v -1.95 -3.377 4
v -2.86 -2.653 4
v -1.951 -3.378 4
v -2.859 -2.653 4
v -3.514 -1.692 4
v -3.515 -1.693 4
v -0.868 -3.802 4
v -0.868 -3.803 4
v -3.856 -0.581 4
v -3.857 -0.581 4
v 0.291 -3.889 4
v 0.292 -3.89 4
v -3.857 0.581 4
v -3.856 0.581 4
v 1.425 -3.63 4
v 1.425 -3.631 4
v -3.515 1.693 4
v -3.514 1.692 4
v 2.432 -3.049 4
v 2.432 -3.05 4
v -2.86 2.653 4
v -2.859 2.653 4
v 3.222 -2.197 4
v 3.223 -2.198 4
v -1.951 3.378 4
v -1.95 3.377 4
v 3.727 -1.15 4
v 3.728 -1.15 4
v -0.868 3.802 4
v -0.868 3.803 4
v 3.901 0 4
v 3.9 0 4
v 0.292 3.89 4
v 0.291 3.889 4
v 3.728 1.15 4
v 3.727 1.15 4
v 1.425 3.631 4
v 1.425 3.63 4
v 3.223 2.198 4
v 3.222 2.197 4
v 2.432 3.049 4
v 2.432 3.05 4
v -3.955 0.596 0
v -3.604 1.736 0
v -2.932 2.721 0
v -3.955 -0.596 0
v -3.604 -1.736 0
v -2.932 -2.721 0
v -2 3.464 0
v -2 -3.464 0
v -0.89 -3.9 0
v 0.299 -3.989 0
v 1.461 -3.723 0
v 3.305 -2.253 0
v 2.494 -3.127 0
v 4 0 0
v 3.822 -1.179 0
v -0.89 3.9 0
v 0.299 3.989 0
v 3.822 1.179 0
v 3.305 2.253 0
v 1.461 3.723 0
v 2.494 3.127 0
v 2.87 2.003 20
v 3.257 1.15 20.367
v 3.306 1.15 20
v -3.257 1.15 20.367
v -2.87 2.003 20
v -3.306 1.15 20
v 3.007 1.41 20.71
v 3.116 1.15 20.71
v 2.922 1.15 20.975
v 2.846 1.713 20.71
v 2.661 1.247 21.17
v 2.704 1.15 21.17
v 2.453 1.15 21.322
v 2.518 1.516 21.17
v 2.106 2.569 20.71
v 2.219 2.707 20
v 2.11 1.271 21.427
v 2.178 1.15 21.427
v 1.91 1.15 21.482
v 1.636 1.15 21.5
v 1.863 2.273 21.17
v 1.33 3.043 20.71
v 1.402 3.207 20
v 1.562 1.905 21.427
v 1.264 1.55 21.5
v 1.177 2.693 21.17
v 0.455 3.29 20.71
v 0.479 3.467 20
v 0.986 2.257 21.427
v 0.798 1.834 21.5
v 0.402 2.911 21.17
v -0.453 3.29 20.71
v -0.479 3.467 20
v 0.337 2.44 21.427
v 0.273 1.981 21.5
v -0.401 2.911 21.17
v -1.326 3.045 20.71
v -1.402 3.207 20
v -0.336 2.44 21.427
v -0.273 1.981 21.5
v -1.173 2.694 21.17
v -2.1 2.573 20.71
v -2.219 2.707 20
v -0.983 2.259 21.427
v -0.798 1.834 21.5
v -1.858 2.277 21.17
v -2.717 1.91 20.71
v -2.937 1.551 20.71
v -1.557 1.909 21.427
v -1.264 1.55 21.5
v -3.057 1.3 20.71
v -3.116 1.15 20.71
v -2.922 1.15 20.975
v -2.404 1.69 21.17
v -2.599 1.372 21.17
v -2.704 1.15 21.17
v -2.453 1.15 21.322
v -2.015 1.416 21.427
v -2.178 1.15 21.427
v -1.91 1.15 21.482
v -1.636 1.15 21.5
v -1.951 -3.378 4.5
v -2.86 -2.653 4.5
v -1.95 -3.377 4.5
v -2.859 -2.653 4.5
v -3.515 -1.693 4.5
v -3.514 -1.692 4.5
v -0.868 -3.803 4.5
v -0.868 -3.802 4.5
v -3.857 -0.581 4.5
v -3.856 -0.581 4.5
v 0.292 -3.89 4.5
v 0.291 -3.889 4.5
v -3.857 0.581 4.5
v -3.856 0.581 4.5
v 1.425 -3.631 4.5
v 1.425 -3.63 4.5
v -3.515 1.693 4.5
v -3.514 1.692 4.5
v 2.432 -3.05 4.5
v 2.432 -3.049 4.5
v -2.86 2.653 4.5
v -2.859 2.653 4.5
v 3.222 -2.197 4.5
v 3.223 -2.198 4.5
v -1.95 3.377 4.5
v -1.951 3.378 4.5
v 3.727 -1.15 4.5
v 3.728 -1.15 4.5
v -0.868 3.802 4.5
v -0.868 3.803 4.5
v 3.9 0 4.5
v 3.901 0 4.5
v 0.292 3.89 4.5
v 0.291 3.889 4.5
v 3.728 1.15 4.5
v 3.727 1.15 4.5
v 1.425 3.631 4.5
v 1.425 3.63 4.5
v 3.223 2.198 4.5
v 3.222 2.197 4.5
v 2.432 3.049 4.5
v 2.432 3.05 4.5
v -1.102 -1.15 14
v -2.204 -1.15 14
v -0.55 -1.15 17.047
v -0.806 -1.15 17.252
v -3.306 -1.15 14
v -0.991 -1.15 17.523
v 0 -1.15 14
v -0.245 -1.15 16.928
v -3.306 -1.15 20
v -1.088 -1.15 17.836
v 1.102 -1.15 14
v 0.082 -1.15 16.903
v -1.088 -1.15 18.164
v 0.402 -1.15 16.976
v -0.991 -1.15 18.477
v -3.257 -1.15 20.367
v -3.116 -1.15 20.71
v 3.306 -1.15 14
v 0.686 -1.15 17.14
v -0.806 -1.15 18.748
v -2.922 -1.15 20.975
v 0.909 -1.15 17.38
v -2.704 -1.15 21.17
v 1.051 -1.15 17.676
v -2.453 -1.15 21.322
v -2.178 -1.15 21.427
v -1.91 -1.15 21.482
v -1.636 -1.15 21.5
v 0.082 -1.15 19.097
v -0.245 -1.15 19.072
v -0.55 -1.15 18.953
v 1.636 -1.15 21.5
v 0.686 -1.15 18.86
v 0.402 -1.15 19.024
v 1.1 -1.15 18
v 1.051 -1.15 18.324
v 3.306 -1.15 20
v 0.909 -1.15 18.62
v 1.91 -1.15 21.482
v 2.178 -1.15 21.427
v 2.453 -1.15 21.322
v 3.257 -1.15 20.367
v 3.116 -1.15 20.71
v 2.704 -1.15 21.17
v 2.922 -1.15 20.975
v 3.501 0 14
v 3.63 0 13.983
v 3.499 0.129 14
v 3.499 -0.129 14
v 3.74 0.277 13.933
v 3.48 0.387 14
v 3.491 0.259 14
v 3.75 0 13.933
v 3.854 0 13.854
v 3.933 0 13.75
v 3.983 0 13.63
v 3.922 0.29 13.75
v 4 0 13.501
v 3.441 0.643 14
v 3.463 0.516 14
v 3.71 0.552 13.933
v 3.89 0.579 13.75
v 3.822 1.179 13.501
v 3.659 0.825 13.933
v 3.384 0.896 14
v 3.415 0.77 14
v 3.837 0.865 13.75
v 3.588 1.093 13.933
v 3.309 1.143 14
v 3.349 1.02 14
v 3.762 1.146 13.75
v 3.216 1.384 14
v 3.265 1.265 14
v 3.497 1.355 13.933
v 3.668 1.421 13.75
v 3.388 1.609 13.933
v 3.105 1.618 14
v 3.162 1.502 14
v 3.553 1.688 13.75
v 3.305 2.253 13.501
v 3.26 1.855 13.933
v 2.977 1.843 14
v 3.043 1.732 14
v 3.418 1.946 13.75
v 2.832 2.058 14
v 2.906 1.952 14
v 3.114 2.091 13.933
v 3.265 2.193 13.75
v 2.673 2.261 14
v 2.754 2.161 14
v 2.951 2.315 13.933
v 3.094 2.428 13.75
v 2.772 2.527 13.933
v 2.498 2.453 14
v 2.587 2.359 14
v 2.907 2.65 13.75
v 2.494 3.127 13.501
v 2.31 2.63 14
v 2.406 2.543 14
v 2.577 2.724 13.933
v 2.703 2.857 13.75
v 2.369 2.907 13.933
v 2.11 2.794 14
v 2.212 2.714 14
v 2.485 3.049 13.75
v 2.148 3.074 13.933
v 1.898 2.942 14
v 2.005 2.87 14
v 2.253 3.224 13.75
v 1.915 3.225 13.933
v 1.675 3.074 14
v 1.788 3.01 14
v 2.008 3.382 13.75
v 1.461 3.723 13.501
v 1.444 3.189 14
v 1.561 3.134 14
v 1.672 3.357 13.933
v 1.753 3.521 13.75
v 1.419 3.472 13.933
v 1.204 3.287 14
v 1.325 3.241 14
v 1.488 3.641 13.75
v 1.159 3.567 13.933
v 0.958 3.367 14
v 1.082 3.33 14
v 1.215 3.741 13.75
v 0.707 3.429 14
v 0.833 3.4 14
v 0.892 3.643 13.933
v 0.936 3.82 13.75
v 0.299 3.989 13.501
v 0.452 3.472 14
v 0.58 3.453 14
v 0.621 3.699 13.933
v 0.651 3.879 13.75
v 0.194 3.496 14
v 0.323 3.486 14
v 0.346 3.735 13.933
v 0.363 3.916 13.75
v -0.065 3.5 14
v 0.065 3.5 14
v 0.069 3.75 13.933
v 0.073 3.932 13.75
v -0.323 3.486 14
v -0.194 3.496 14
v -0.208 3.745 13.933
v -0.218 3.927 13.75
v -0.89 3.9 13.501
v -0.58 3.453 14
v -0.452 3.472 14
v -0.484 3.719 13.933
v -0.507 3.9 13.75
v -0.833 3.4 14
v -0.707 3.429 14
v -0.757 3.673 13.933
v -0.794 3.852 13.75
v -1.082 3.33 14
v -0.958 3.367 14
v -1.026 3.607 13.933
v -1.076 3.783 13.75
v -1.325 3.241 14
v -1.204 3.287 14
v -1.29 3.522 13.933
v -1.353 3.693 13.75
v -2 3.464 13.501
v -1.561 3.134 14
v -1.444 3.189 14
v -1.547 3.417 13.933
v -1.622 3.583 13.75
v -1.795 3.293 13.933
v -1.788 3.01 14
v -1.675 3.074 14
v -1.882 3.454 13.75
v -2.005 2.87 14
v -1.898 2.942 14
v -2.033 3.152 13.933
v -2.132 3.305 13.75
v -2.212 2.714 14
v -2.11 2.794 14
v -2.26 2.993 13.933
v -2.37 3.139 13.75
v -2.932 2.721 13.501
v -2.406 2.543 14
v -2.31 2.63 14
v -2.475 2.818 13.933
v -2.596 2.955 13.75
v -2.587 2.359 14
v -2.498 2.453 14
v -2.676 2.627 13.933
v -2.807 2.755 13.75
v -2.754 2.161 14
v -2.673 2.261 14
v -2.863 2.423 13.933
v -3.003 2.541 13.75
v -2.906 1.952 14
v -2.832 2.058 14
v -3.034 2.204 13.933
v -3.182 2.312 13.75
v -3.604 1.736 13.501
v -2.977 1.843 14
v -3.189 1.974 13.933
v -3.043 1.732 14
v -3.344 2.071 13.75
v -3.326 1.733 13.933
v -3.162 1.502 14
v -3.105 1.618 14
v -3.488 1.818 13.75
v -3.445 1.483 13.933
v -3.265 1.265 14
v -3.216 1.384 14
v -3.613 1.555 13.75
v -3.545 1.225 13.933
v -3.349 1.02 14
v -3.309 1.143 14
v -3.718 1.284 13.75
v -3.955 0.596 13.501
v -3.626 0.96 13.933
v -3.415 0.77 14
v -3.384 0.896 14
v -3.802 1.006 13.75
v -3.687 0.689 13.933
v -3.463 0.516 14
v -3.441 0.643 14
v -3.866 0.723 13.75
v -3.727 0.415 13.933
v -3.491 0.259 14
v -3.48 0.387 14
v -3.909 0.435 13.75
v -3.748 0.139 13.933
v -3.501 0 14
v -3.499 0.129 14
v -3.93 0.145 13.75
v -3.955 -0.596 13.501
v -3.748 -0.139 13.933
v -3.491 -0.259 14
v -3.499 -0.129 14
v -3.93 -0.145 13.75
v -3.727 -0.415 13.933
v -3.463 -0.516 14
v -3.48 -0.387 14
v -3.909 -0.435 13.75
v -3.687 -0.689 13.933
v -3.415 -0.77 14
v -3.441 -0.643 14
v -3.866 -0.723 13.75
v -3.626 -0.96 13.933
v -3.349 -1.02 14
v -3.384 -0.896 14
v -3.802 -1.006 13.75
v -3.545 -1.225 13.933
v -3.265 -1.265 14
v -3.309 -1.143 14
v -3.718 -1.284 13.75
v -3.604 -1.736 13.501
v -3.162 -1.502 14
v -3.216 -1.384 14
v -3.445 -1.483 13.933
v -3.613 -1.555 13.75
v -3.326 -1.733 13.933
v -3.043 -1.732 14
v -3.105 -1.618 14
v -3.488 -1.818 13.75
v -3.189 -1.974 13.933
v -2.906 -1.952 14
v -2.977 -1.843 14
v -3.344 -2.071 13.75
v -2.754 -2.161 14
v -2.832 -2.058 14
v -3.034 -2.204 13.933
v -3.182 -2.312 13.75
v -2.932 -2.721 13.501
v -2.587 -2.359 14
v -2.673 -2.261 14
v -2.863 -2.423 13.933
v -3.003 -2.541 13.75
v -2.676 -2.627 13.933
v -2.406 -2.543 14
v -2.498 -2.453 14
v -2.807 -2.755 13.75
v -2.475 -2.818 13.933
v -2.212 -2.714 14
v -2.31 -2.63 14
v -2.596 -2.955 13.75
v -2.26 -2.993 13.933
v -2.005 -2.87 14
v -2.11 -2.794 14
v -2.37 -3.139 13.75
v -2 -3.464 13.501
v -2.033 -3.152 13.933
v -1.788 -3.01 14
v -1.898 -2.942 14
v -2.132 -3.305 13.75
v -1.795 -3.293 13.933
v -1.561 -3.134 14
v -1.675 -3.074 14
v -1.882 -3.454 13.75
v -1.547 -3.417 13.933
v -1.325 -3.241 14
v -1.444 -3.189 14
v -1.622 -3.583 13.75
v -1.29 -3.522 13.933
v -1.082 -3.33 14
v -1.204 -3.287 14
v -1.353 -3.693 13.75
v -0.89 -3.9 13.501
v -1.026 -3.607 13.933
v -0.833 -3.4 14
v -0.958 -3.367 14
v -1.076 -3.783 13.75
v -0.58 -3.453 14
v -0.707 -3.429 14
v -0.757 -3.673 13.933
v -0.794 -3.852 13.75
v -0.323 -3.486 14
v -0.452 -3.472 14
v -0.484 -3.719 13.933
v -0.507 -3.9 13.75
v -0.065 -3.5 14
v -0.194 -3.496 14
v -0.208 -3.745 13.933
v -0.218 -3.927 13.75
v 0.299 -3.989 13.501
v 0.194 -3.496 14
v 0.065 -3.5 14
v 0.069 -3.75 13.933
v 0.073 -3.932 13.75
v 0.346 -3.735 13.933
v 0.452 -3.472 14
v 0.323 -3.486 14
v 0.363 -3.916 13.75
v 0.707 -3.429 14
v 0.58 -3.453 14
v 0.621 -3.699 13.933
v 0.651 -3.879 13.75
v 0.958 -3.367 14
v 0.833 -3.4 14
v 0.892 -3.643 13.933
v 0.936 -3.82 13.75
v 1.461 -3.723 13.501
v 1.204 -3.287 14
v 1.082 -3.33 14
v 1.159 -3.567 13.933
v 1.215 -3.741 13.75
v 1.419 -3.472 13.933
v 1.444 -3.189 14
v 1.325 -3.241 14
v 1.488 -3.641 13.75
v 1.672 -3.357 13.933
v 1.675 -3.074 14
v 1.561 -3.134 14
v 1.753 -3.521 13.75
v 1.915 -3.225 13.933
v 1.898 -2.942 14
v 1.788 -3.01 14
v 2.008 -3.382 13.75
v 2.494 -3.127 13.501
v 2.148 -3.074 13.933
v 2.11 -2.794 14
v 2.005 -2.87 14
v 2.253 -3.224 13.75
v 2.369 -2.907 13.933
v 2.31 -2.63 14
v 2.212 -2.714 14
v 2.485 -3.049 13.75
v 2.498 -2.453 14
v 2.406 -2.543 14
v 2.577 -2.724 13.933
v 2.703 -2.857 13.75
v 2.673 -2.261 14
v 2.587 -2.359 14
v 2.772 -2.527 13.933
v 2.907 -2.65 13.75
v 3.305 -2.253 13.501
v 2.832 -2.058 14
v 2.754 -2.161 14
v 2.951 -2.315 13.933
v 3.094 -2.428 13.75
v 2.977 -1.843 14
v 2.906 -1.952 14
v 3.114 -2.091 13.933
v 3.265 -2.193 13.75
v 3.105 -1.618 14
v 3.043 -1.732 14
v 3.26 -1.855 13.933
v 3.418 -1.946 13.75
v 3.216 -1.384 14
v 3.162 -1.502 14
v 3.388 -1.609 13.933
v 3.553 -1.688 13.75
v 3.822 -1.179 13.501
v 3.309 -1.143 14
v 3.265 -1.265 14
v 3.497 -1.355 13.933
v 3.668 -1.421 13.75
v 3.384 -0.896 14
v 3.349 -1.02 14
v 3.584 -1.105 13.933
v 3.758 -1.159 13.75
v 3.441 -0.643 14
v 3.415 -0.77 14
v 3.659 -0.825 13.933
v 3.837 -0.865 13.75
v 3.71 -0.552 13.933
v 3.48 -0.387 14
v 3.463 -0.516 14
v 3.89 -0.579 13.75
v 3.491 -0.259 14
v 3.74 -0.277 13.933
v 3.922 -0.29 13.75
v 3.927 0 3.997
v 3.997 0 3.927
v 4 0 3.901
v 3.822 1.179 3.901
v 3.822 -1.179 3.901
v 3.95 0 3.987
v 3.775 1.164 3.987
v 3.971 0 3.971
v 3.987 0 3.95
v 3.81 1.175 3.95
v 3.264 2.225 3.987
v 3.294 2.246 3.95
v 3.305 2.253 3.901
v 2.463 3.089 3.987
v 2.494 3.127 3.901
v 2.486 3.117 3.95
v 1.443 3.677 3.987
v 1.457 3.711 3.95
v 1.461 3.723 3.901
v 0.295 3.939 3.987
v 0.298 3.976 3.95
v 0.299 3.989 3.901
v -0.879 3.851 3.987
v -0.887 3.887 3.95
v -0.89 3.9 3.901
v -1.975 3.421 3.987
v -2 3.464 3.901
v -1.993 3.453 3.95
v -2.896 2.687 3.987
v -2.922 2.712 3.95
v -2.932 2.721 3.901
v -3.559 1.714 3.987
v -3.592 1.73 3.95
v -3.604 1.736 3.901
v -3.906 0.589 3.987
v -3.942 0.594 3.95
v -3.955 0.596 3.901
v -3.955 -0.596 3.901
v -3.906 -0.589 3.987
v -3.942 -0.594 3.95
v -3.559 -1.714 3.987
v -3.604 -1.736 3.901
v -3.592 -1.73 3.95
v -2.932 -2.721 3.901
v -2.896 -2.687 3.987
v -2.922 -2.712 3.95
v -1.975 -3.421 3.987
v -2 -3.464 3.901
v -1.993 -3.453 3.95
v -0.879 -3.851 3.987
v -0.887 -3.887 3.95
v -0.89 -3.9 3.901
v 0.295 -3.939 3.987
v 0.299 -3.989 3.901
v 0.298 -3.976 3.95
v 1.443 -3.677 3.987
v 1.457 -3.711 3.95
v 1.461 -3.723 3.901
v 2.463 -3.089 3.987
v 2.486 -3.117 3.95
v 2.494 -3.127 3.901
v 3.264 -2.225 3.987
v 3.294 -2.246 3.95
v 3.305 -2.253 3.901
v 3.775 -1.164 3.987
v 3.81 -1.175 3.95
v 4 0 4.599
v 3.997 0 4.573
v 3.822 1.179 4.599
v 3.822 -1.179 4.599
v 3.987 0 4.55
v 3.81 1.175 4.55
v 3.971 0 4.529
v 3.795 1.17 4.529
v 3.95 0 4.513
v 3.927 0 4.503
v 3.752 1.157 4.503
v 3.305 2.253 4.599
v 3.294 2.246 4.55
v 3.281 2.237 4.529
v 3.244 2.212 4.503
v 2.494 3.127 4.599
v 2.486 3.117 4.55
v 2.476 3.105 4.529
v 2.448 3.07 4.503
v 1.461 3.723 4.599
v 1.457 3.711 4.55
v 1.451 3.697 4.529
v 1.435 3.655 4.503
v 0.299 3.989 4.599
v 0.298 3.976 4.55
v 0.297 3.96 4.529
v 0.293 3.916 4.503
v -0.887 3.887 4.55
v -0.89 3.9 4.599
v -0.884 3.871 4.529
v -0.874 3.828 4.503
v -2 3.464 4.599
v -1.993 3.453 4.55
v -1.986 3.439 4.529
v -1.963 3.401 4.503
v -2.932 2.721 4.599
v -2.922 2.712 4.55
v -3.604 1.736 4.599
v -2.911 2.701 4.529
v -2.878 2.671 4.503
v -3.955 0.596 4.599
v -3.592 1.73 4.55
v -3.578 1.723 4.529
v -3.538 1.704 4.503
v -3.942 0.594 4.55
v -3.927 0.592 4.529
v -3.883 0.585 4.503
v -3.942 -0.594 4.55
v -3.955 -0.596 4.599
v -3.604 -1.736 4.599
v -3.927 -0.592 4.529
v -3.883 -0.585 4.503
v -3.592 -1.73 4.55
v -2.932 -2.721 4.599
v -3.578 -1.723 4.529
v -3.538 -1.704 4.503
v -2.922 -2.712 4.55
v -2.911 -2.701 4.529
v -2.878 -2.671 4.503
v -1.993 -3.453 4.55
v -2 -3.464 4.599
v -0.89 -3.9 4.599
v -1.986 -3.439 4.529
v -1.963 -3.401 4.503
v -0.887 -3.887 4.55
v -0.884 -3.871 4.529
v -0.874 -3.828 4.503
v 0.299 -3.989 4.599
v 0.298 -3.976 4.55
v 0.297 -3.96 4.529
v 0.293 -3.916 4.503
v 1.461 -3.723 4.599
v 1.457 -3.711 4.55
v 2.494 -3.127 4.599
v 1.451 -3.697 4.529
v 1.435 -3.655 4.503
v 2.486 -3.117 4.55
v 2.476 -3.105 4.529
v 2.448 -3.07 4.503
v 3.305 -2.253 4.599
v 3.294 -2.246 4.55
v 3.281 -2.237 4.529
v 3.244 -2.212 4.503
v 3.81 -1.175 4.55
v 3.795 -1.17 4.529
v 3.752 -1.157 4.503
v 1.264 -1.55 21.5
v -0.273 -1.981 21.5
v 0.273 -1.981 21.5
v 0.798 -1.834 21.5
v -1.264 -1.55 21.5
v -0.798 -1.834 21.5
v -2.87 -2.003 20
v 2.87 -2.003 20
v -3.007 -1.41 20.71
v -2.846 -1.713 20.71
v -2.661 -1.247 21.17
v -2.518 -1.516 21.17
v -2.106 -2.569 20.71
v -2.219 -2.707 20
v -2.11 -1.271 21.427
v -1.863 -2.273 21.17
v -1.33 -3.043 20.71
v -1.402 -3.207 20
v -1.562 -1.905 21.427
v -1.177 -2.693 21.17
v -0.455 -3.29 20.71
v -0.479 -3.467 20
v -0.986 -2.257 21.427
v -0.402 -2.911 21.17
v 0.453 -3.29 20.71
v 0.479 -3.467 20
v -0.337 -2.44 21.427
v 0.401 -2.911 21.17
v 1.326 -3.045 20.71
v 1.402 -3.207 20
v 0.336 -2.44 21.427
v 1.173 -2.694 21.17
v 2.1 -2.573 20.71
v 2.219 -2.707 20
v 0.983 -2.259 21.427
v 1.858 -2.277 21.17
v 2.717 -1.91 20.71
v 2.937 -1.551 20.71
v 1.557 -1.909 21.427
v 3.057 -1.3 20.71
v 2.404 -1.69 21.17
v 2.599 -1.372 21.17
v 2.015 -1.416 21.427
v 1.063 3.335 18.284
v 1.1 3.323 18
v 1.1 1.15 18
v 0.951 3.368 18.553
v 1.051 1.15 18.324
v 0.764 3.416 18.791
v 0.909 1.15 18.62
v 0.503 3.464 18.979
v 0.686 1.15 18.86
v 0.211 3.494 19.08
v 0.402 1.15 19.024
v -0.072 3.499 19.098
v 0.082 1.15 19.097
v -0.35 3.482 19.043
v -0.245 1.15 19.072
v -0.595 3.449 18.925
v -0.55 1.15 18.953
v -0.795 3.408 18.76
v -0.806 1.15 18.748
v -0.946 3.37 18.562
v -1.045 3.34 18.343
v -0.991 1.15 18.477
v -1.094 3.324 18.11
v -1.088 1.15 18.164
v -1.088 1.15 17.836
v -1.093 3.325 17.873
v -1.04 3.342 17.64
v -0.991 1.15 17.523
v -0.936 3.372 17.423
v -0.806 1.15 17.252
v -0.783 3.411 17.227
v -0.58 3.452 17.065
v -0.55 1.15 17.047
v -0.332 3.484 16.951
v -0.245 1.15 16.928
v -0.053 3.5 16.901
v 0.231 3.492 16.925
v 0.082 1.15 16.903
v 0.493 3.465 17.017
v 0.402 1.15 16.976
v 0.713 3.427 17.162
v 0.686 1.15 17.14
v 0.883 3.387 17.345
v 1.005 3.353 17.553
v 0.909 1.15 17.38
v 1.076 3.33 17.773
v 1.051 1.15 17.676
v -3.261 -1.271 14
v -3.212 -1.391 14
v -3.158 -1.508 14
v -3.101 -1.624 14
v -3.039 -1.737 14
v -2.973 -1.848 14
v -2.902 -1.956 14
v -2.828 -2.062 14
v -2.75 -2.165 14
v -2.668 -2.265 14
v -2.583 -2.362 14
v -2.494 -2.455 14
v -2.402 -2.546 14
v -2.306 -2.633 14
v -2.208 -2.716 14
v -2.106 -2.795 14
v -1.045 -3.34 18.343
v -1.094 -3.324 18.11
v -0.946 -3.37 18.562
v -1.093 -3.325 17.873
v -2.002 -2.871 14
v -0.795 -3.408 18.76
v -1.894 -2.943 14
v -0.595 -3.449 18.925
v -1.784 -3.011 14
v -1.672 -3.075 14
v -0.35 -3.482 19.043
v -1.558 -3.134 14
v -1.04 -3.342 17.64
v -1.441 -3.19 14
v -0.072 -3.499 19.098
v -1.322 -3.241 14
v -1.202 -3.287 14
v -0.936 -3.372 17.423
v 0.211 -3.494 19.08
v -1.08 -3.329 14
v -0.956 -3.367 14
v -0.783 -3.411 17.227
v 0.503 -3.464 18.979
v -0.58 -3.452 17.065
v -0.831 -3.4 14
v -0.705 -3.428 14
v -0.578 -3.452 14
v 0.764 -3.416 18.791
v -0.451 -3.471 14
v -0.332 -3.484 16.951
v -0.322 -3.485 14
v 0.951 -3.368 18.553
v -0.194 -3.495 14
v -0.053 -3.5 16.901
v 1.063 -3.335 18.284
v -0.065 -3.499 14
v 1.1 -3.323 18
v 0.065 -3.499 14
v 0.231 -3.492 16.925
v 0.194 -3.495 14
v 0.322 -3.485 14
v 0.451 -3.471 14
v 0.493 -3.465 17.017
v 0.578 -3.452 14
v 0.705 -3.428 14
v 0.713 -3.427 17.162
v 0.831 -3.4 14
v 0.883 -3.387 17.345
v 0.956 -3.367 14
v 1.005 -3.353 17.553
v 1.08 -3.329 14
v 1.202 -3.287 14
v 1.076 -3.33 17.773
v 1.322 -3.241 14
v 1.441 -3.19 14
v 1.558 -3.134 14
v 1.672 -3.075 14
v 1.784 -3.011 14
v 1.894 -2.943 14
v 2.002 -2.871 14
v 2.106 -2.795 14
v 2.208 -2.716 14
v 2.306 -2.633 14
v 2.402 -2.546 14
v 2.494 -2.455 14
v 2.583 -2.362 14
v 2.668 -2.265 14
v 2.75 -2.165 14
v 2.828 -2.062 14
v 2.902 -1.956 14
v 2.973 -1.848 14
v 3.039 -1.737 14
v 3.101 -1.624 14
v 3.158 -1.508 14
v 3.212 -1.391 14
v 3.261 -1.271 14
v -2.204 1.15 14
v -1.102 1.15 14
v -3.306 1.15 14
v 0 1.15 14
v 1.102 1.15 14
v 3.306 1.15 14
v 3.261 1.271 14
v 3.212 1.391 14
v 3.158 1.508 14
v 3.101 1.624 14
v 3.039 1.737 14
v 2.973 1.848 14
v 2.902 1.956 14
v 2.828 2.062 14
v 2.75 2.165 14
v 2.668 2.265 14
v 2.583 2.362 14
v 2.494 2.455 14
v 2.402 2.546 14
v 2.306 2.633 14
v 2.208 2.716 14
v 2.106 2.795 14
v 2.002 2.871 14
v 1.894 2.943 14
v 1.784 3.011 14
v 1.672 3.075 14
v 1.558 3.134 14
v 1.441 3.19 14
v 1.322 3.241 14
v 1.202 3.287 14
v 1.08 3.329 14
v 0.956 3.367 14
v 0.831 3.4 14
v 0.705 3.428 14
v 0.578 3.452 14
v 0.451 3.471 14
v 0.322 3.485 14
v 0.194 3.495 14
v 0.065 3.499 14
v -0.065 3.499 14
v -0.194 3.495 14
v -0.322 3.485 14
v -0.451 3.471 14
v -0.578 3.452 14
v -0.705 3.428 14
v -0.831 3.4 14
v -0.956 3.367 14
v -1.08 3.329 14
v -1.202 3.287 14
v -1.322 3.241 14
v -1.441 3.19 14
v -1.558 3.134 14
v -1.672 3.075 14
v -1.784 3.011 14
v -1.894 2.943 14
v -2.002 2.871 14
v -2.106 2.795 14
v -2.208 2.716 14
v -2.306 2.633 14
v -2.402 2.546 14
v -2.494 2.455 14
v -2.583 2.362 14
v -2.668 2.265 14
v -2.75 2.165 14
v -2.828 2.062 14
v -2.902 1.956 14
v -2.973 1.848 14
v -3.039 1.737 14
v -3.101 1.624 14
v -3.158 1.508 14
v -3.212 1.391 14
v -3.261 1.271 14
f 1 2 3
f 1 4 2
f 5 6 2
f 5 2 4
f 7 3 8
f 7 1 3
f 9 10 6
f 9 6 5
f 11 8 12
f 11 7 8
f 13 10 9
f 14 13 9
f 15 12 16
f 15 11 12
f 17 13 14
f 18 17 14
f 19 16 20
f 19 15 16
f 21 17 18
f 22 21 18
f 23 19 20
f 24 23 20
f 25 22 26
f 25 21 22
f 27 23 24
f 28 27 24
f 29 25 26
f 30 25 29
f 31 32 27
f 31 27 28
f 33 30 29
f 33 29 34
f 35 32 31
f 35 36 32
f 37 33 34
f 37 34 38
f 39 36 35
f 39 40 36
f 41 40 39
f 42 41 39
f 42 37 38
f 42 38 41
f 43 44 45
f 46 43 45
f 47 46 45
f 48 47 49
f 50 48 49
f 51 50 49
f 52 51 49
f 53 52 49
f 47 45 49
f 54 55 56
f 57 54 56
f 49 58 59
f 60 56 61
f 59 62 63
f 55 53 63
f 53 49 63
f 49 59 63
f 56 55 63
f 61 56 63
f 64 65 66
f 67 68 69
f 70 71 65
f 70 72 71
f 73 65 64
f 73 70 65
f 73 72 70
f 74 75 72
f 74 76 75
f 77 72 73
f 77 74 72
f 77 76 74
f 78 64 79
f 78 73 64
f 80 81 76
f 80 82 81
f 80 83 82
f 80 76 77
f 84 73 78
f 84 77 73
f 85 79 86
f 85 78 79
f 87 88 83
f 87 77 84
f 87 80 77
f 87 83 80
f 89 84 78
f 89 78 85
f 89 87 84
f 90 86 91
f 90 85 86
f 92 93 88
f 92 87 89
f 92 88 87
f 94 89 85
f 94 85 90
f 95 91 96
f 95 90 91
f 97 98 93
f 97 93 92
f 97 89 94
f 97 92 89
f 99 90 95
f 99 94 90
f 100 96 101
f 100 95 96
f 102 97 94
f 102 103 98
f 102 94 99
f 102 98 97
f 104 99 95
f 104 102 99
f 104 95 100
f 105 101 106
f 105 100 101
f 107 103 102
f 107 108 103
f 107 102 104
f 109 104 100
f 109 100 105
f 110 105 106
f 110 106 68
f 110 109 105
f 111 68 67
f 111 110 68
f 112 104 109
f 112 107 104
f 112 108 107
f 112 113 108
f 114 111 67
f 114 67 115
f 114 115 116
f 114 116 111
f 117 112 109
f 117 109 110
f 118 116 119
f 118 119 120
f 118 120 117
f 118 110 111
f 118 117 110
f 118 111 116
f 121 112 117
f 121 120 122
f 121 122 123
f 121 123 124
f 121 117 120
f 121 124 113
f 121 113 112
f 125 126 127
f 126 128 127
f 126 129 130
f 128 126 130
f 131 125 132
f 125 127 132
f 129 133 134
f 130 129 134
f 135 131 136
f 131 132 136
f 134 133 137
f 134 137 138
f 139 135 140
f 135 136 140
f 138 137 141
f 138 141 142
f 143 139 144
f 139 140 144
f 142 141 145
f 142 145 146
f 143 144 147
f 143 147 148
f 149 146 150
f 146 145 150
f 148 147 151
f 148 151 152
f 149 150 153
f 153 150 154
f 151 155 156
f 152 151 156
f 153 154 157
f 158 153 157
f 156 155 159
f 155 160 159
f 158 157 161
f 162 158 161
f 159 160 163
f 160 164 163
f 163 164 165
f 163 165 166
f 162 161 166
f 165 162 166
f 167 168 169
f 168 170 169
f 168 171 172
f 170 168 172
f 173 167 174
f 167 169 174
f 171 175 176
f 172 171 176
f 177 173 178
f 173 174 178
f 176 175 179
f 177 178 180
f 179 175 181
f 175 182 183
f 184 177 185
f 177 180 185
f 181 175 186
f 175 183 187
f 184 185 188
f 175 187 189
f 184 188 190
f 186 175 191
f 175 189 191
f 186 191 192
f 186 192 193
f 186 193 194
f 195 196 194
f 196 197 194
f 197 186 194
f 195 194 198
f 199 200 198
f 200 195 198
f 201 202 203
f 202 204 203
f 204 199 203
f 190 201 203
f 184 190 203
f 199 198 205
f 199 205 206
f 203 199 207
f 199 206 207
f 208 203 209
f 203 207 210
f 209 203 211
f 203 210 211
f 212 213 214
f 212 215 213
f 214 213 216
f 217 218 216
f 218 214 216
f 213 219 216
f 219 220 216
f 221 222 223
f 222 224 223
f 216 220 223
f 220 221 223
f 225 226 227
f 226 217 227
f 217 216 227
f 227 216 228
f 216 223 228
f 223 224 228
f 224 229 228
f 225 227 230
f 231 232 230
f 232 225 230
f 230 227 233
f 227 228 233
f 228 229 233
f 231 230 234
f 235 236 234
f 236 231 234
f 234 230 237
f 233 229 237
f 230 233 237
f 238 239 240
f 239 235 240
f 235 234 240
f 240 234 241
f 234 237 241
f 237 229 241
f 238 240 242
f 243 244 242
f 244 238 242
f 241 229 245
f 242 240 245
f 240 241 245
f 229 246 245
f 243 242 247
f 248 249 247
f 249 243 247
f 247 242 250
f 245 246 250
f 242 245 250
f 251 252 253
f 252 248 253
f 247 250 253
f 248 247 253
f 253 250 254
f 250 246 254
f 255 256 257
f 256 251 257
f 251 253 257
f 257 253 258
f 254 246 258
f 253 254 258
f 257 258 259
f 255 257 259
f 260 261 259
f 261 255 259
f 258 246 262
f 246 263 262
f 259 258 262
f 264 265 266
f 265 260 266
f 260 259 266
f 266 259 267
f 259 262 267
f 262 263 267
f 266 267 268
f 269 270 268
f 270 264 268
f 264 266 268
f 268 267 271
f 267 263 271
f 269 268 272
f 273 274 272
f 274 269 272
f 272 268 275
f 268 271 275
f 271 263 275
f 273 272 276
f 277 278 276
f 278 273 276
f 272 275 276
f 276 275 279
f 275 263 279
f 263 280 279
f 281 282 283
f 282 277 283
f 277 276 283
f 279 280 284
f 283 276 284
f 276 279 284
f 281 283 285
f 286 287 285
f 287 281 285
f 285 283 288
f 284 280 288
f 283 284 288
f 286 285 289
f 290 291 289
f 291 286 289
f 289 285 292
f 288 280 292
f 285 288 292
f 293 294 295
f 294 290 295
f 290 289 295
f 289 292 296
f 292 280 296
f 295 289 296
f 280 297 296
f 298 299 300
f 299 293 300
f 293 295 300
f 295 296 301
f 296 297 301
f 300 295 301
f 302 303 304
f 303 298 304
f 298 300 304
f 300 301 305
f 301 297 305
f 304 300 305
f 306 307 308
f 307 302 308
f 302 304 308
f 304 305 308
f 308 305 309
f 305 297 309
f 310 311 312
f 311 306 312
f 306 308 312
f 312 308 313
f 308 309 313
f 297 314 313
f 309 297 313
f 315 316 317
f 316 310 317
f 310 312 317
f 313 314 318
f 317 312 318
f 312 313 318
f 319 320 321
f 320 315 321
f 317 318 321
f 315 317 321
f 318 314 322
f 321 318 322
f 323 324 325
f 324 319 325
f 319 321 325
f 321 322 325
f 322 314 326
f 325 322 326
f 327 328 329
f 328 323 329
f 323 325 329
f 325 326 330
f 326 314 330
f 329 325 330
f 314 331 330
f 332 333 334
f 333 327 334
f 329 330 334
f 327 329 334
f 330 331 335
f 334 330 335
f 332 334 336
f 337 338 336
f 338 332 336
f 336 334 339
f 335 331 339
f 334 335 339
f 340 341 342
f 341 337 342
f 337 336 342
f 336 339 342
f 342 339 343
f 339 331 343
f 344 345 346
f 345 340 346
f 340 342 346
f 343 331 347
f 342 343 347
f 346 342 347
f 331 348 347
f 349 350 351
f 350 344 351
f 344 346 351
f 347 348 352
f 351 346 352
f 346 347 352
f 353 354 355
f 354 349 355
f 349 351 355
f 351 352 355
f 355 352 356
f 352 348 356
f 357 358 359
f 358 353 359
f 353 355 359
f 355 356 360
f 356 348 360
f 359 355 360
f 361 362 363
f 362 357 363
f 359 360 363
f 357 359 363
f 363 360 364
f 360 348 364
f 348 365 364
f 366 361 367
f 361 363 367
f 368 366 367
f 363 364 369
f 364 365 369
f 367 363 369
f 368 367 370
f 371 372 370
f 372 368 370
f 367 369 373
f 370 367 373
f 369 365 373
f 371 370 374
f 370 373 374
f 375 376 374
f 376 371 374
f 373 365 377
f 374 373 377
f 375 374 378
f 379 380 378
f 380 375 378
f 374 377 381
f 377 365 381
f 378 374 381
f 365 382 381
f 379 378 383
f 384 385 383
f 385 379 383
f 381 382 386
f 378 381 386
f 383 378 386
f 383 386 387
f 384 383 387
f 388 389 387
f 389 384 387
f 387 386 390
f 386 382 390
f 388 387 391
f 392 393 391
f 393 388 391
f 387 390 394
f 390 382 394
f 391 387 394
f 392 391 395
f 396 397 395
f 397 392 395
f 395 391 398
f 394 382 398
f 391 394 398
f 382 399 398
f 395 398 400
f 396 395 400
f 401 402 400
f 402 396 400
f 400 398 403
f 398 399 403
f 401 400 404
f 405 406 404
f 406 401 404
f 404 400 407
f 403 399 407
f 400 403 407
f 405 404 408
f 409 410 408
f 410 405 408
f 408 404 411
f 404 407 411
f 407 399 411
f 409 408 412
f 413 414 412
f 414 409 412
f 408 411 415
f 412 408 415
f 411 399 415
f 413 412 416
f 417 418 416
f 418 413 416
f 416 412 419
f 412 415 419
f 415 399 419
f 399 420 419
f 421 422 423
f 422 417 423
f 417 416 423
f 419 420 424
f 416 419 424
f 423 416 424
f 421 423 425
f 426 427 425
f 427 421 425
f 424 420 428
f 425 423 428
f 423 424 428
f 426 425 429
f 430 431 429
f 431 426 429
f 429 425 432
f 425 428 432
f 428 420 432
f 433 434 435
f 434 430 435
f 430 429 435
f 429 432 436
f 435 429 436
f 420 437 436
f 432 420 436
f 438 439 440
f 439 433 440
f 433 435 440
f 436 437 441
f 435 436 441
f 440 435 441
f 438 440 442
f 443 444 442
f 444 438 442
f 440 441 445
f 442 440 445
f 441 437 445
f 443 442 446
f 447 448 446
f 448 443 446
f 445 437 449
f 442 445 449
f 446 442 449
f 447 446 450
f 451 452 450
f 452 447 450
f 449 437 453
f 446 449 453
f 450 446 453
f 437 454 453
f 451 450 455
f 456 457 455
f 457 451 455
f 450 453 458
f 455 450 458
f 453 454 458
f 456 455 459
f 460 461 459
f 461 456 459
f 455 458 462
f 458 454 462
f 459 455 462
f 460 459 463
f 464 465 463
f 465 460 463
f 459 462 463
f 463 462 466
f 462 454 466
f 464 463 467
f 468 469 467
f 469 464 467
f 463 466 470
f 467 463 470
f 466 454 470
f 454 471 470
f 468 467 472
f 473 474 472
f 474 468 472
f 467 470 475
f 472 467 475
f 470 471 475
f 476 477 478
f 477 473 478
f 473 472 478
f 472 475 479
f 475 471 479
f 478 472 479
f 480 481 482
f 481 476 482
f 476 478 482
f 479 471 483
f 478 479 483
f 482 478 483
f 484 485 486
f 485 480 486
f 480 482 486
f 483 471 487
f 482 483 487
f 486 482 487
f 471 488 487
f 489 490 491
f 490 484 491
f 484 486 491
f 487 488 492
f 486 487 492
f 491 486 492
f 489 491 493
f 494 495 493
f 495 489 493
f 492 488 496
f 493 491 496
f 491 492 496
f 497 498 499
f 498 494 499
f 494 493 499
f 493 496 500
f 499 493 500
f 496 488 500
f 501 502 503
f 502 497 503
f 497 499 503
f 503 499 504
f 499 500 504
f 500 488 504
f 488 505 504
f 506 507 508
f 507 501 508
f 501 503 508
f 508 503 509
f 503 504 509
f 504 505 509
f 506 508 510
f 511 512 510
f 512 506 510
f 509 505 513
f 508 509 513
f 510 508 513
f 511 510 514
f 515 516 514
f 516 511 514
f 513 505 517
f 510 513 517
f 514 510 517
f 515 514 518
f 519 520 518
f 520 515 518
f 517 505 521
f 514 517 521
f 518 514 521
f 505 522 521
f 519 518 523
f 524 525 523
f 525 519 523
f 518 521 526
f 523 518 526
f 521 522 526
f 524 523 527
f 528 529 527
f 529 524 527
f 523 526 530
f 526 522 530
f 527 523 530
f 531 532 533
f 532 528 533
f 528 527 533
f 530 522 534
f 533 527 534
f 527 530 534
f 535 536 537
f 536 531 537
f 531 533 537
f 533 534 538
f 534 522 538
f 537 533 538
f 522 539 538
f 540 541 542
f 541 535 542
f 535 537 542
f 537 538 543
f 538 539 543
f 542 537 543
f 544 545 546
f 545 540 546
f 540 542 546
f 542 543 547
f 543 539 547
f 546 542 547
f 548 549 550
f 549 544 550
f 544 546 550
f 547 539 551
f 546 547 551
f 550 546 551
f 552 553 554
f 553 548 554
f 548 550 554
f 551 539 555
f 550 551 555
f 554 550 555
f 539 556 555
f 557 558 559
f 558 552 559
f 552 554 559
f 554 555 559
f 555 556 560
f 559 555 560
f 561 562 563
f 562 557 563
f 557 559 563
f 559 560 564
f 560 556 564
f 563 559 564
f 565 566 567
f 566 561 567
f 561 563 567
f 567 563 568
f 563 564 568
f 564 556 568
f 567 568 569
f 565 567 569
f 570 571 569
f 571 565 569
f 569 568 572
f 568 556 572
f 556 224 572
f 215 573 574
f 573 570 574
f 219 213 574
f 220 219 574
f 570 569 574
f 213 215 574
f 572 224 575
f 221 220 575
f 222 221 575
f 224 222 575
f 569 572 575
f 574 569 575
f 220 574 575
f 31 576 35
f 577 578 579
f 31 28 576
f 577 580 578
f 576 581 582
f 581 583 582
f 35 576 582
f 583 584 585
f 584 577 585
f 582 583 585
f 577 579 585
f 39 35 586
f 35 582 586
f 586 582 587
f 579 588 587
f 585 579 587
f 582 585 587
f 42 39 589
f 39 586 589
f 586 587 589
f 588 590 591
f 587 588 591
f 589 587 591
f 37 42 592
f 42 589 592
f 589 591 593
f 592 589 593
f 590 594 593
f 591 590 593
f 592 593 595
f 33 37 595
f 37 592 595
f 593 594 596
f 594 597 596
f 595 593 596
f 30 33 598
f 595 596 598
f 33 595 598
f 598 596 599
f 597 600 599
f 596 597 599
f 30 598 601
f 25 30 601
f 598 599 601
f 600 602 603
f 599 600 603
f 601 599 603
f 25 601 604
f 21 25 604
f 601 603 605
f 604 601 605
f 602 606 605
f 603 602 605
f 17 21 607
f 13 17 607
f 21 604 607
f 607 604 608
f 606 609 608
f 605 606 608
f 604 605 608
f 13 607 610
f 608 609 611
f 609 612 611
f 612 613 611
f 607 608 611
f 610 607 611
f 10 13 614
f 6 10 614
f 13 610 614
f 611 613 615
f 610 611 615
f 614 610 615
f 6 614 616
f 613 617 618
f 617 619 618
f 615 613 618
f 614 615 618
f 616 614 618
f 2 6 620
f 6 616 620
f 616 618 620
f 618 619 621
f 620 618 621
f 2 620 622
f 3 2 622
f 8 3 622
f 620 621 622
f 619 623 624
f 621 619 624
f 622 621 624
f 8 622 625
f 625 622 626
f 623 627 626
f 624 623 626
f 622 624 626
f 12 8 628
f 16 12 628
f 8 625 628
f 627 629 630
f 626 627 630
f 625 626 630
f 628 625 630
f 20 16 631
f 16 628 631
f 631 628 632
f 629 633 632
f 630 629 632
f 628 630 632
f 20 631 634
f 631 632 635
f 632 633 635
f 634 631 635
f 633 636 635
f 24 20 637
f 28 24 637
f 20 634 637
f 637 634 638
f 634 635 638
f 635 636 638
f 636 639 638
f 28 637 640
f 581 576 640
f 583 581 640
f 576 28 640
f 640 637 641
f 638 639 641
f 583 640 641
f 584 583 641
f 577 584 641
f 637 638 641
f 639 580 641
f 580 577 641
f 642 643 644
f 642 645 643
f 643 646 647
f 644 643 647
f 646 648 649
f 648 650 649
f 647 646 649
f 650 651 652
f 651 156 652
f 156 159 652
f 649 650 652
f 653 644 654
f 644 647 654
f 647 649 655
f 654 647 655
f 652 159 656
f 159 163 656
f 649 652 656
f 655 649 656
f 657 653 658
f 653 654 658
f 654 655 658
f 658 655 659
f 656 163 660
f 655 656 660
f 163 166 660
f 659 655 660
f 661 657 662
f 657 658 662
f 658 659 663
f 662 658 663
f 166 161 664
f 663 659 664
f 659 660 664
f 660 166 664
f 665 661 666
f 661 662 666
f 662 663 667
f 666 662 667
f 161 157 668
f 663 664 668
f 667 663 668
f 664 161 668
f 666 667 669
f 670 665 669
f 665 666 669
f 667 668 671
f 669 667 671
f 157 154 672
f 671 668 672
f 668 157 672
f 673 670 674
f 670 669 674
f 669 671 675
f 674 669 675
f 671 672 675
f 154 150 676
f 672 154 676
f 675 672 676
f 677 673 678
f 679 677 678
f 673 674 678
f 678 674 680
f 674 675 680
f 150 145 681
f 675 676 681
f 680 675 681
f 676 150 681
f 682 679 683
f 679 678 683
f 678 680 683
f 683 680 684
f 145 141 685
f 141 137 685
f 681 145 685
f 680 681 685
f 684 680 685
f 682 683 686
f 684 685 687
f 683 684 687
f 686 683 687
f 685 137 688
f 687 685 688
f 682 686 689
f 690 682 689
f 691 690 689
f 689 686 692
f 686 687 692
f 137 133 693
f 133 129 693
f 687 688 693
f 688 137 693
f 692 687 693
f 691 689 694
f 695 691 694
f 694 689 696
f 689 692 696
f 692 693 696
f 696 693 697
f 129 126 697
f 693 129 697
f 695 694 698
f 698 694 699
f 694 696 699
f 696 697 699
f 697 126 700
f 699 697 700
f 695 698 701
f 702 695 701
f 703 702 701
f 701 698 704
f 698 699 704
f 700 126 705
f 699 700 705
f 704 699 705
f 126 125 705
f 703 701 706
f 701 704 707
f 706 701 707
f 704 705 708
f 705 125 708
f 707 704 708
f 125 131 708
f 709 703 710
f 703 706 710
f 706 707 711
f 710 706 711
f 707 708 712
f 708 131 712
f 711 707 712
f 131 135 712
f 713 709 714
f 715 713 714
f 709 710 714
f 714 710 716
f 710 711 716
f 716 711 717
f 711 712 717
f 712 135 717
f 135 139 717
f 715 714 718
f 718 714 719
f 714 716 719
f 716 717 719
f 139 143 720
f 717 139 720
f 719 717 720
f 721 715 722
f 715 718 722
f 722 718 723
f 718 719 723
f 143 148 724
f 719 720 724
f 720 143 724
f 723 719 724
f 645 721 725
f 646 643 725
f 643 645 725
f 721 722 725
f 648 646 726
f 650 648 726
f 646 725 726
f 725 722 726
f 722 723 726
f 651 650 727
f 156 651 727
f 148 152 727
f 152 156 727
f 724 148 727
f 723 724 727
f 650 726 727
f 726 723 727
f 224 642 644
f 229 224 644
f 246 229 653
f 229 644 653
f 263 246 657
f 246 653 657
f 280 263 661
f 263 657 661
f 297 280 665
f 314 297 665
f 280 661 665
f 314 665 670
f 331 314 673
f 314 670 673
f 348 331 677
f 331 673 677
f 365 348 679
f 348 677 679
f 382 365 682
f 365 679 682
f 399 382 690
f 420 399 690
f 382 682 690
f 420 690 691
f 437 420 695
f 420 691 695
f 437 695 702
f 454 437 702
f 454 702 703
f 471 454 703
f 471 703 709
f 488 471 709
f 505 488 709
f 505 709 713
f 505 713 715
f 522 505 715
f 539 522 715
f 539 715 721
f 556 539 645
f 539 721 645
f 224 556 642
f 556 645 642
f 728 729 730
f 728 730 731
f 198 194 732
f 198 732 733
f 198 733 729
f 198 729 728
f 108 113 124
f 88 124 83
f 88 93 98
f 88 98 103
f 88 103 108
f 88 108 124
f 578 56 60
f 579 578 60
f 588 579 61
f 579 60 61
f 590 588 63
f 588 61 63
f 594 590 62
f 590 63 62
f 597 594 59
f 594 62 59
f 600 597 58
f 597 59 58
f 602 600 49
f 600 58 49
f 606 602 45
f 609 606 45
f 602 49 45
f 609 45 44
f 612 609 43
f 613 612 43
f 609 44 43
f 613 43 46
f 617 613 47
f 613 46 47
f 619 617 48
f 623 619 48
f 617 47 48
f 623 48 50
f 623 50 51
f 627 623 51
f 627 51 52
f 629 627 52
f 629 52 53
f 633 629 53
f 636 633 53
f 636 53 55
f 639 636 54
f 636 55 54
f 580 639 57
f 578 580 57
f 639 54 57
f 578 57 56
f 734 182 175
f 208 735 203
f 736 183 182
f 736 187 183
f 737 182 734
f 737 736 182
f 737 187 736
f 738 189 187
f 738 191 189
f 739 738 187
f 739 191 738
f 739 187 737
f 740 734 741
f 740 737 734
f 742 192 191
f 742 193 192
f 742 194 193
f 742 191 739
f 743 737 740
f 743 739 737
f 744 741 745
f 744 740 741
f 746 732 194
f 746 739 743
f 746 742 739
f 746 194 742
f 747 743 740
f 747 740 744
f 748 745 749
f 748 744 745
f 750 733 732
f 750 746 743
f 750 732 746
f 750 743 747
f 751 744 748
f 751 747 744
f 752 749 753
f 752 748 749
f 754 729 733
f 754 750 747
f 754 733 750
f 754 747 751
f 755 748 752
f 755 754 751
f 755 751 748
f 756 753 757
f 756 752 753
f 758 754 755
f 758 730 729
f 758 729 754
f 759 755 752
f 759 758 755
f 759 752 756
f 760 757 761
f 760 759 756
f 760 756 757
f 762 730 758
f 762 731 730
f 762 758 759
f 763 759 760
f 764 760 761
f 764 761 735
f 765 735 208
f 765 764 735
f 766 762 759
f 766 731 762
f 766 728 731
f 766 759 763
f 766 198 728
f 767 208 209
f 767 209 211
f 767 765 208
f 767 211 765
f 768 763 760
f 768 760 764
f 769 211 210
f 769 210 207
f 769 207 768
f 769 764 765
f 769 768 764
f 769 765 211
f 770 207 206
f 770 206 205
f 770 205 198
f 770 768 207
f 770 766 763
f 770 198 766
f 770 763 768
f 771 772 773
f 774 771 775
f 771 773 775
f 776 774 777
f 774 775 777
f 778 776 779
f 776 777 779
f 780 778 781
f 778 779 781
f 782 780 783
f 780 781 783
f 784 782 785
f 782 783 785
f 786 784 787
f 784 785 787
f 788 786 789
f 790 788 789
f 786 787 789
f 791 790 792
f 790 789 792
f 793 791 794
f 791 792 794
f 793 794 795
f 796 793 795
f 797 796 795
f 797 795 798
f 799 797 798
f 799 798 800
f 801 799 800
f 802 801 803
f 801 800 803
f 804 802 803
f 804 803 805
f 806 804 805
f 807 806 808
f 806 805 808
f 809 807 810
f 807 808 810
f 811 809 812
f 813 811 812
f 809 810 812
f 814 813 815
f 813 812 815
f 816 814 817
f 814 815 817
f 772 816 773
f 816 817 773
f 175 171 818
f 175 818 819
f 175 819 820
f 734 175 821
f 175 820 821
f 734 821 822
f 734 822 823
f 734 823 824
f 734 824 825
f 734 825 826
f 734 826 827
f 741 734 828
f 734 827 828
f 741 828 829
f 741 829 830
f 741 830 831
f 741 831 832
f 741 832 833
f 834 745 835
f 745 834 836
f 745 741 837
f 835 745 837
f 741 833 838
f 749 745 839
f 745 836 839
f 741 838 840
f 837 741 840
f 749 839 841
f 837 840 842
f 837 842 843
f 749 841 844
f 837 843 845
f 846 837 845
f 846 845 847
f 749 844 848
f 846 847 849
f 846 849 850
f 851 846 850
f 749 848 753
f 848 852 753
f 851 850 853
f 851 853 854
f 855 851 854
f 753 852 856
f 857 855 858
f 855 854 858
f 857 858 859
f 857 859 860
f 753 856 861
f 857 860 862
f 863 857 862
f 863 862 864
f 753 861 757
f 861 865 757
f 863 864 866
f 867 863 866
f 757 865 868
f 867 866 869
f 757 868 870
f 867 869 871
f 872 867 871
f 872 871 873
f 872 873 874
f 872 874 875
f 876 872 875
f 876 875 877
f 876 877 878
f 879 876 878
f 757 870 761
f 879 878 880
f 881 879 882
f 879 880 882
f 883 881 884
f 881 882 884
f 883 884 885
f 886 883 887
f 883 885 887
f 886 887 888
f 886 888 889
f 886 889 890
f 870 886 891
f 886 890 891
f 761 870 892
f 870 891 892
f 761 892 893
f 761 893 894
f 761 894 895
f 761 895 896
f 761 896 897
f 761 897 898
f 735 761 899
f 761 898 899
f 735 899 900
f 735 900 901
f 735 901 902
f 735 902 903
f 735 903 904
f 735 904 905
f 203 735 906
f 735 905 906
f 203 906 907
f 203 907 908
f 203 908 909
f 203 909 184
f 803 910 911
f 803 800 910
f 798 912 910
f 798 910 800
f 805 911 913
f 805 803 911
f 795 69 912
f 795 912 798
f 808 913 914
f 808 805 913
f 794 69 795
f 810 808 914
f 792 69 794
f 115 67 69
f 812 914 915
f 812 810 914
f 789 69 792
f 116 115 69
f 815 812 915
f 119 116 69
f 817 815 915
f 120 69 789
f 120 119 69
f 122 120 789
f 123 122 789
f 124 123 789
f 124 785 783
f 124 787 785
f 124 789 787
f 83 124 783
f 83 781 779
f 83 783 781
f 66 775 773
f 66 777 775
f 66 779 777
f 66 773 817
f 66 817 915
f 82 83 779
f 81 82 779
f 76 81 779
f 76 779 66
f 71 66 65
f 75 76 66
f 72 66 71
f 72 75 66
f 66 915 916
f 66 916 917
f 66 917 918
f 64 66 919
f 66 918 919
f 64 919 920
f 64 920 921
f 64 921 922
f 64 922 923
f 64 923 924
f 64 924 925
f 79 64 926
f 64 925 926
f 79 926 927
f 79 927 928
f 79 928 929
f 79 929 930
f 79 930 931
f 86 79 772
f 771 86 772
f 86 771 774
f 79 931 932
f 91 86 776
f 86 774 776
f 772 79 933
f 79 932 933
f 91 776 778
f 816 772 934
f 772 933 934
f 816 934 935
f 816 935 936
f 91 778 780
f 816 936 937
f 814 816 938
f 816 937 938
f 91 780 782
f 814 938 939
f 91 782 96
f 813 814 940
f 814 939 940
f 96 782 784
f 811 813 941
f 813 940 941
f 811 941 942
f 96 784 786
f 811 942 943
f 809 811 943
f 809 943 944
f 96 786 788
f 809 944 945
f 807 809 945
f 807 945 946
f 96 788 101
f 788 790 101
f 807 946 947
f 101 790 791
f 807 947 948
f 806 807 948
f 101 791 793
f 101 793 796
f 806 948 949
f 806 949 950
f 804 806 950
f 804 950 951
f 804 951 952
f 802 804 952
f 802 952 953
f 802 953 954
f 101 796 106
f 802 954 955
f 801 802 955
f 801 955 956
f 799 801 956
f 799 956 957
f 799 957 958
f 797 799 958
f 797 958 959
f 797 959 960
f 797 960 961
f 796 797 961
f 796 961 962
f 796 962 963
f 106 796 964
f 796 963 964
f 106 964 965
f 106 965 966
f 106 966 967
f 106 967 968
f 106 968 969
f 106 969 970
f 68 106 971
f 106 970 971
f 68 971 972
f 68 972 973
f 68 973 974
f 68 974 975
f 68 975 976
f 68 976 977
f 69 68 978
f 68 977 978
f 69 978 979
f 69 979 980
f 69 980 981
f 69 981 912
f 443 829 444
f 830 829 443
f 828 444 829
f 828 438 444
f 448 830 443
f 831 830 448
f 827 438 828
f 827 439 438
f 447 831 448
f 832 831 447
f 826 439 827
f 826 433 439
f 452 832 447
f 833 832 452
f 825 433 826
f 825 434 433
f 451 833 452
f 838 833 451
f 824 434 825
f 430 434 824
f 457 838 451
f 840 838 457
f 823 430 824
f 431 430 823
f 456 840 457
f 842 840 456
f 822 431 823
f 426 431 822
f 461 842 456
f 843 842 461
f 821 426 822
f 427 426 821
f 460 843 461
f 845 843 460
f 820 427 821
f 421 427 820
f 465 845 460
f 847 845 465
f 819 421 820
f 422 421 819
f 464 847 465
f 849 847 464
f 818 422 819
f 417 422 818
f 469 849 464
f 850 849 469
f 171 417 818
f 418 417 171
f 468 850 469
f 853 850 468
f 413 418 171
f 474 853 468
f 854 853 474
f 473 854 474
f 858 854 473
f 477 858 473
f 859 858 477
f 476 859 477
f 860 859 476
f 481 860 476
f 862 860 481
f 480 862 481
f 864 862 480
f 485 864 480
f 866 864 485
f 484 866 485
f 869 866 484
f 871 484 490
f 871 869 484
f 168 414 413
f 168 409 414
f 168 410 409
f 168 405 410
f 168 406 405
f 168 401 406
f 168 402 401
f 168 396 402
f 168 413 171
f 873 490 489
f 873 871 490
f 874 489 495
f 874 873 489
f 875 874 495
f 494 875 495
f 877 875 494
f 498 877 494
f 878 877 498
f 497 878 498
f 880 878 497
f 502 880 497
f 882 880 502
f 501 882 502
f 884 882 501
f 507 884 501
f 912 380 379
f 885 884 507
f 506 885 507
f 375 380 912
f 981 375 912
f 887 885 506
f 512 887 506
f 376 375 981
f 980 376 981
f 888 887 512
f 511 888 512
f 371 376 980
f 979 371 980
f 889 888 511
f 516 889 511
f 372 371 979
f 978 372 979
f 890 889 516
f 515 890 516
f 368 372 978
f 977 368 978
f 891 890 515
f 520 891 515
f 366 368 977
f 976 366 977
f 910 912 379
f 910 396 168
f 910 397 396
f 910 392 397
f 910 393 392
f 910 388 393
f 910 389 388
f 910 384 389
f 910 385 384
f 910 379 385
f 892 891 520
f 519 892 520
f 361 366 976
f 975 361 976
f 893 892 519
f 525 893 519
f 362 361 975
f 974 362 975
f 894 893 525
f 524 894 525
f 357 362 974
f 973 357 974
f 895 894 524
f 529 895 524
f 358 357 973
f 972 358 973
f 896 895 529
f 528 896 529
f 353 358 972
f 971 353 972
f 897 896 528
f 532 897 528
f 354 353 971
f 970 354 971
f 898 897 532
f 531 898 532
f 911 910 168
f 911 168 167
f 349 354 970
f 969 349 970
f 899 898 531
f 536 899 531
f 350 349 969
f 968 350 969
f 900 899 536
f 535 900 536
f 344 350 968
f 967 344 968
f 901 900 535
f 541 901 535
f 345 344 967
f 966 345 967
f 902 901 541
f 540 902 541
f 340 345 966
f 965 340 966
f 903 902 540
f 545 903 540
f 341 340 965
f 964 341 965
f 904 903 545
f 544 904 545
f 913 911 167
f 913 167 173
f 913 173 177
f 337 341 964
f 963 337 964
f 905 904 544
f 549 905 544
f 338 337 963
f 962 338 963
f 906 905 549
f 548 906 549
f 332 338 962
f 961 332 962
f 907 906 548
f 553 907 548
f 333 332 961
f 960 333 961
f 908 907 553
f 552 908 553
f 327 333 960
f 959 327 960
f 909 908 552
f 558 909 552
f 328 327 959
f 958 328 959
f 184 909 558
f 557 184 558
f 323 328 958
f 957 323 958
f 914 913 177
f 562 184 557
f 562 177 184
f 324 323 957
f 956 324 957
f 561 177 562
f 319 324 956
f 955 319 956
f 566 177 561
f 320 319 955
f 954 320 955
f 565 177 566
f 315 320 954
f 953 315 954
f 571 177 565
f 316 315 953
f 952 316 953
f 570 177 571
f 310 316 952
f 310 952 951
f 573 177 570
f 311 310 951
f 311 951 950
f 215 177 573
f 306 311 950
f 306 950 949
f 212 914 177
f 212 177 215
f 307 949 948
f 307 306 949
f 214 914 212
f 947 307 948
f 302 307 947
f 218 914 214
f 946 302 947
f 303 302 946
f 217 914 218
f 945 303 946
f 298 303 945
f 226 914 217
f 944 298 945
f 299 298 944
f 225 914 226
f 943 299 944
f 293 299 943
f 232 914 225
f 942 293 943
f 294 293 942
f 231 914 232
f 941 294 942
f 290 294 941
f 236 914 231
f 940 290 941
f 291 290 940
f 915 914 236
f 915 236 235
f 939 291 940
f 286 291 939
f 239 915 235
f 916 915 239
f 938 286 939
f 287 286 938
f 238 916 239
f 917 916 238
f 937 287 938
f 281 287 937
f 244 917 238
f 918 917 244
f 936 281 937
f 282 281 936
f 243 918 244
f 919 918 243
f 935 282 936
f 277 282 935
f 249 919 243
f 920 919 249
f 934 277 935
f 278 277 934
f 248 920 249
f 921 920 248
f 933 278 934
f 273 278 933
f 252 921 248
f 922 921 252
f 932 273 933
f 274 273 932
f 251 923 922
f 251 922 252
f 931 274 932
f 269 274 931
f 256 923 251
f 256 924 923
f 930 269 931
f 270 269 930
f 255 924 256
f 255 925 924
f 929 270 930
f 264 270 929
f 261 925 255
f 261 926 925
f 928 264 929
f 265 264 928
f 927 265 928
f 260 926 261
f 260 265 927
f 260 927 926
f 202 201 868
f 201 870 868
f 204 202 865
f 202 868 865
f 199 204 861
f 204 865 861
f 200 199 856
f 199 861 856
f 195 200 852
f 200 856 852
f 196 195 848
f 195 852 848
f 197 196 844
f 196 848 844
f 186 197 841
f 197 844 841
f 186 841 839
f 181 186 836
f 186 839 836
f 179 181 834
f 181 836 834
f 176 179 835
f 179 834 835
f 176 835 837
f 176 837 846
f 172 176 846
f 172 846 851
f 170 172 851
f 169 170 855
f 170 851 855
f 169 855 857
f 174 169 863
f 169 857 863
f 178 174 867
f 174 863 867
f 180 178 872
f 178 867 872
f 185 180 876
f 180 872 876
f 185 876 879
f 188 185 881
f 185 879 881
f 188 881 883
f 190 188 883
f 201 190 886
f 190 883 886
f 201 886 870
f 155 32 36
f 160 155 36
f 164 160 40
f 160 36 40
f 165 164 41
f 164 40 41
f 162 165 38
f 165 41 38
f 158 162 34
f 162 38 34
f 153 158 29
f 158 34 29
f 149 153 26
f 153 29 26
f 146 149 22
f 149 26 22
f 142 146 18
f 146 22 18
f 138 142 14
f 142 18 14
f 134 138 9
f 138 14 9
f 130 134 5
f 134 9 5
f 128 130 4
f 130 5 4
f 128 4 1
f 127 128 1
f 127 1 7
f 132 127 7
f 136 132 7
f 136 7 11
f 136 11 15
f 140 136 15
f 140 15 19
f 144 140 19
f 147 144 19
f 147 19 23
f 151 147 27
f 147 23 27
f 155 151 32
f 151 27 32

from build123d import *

# Parameters (mm, degrees)
SKETCH004_W  = 10
SKETCH004_H  = 8
PAD004_DEPTH = 1.15
SKETCH_R     = 4
PAD_DEPTH    = 4
SKETCH001_R  = 3.9
PAD001_DEPTH = 0.5
SKETCH002_R  = 4
PAD002_DEPTH = 9.5
SKETCH003_R  = 3.5
PAD003_DEPTH = 7.5
FILLET_R     = 1.5
FILLET001_R  = 0.499
FILLET002_R  = 0.099
SKETCH005_R  = 1.1
POCKET_DEPTH = 5


with BuildPart() as body001:
    # Sketch004 (on DatumPlane) → Pad004 (new body, symmetric)
    with BuildSketch(Plane(origin=(0, 0, 17), x_dir=(1, 0, 0), z_dir=(0, -1, 0))):
        with Locations((0, 1)):
            Rectangle(SKETCH004_W, SKETCH004_H)
    extrude(amount=PAD004_DEPTH, both=True)


with BuildPart() as body:
    # Sketch → Pad (new body)
    with BuildSketch(Plane.XY):
        Circle(SKETCH_R)
    extrude(amount=PAD_DEPTH)

    # Sketch001 (on Face3 of Pad) → Pad001 (join)
    with BuildSketch(Plane.XY.offset(4)):
        Circle(SKETCH001_R)
    extrude(amount=PAD001_DEPTH)

    # Sketch002 (on Face5 of Pad001) → Pad002 (join)
    with BuildSketch(Plane.XY.offset(4.5)):
        Circle(SKETCH002_R)
    extrude(amount=PAD002_DEPTH)

    # Sketch003 (on Face3 of Pad002) → Pad003 (join)
    with BuildSketch(Plane.XY.offset(14)):
        Circle(SKETCH003_R)
    extrude(amount=PAD003_DEPTH)

    # Fillet
    fillet_edges = [body.edges().sort_by_distance(p)[0] for p in [
        (-3.5, 0, 21.5),
    ]]
    fillet(fillet_edges, radius=FILLET_R)

    # Fillet001
    fillet001_edges = [body.edges().sort_by_distance(p)[0] for p in [
        (-4, 0, 14),
    ]]
    fillet(fillet001_edges, radius=FILLET001_R)

    # Fillet002
    fillet002_edges = [body.edges().sort_by_distance(p)[0] for p in [
        (-4, 0, 4),
        (-4, 0, 4.5),
    ]]
    fillet(fillet002_edges, radius=FILLET002_R)

    # Boolean: cut Body001
    add(body001.part, mode=Mode.SUBTRACT)

    # Sketch005 (on Face14 of Boolean) → Pocket (cut, symmetric)
    with BuildSketch(Plane.XZ.offset(-1.15)):
        with Locations((0, 18)):
            Circle(SKETCH005_R)
    extrude(amount=POCKET_DEPTH, both=True, mode=Mode.SUBTRACT)


solid = body.part
